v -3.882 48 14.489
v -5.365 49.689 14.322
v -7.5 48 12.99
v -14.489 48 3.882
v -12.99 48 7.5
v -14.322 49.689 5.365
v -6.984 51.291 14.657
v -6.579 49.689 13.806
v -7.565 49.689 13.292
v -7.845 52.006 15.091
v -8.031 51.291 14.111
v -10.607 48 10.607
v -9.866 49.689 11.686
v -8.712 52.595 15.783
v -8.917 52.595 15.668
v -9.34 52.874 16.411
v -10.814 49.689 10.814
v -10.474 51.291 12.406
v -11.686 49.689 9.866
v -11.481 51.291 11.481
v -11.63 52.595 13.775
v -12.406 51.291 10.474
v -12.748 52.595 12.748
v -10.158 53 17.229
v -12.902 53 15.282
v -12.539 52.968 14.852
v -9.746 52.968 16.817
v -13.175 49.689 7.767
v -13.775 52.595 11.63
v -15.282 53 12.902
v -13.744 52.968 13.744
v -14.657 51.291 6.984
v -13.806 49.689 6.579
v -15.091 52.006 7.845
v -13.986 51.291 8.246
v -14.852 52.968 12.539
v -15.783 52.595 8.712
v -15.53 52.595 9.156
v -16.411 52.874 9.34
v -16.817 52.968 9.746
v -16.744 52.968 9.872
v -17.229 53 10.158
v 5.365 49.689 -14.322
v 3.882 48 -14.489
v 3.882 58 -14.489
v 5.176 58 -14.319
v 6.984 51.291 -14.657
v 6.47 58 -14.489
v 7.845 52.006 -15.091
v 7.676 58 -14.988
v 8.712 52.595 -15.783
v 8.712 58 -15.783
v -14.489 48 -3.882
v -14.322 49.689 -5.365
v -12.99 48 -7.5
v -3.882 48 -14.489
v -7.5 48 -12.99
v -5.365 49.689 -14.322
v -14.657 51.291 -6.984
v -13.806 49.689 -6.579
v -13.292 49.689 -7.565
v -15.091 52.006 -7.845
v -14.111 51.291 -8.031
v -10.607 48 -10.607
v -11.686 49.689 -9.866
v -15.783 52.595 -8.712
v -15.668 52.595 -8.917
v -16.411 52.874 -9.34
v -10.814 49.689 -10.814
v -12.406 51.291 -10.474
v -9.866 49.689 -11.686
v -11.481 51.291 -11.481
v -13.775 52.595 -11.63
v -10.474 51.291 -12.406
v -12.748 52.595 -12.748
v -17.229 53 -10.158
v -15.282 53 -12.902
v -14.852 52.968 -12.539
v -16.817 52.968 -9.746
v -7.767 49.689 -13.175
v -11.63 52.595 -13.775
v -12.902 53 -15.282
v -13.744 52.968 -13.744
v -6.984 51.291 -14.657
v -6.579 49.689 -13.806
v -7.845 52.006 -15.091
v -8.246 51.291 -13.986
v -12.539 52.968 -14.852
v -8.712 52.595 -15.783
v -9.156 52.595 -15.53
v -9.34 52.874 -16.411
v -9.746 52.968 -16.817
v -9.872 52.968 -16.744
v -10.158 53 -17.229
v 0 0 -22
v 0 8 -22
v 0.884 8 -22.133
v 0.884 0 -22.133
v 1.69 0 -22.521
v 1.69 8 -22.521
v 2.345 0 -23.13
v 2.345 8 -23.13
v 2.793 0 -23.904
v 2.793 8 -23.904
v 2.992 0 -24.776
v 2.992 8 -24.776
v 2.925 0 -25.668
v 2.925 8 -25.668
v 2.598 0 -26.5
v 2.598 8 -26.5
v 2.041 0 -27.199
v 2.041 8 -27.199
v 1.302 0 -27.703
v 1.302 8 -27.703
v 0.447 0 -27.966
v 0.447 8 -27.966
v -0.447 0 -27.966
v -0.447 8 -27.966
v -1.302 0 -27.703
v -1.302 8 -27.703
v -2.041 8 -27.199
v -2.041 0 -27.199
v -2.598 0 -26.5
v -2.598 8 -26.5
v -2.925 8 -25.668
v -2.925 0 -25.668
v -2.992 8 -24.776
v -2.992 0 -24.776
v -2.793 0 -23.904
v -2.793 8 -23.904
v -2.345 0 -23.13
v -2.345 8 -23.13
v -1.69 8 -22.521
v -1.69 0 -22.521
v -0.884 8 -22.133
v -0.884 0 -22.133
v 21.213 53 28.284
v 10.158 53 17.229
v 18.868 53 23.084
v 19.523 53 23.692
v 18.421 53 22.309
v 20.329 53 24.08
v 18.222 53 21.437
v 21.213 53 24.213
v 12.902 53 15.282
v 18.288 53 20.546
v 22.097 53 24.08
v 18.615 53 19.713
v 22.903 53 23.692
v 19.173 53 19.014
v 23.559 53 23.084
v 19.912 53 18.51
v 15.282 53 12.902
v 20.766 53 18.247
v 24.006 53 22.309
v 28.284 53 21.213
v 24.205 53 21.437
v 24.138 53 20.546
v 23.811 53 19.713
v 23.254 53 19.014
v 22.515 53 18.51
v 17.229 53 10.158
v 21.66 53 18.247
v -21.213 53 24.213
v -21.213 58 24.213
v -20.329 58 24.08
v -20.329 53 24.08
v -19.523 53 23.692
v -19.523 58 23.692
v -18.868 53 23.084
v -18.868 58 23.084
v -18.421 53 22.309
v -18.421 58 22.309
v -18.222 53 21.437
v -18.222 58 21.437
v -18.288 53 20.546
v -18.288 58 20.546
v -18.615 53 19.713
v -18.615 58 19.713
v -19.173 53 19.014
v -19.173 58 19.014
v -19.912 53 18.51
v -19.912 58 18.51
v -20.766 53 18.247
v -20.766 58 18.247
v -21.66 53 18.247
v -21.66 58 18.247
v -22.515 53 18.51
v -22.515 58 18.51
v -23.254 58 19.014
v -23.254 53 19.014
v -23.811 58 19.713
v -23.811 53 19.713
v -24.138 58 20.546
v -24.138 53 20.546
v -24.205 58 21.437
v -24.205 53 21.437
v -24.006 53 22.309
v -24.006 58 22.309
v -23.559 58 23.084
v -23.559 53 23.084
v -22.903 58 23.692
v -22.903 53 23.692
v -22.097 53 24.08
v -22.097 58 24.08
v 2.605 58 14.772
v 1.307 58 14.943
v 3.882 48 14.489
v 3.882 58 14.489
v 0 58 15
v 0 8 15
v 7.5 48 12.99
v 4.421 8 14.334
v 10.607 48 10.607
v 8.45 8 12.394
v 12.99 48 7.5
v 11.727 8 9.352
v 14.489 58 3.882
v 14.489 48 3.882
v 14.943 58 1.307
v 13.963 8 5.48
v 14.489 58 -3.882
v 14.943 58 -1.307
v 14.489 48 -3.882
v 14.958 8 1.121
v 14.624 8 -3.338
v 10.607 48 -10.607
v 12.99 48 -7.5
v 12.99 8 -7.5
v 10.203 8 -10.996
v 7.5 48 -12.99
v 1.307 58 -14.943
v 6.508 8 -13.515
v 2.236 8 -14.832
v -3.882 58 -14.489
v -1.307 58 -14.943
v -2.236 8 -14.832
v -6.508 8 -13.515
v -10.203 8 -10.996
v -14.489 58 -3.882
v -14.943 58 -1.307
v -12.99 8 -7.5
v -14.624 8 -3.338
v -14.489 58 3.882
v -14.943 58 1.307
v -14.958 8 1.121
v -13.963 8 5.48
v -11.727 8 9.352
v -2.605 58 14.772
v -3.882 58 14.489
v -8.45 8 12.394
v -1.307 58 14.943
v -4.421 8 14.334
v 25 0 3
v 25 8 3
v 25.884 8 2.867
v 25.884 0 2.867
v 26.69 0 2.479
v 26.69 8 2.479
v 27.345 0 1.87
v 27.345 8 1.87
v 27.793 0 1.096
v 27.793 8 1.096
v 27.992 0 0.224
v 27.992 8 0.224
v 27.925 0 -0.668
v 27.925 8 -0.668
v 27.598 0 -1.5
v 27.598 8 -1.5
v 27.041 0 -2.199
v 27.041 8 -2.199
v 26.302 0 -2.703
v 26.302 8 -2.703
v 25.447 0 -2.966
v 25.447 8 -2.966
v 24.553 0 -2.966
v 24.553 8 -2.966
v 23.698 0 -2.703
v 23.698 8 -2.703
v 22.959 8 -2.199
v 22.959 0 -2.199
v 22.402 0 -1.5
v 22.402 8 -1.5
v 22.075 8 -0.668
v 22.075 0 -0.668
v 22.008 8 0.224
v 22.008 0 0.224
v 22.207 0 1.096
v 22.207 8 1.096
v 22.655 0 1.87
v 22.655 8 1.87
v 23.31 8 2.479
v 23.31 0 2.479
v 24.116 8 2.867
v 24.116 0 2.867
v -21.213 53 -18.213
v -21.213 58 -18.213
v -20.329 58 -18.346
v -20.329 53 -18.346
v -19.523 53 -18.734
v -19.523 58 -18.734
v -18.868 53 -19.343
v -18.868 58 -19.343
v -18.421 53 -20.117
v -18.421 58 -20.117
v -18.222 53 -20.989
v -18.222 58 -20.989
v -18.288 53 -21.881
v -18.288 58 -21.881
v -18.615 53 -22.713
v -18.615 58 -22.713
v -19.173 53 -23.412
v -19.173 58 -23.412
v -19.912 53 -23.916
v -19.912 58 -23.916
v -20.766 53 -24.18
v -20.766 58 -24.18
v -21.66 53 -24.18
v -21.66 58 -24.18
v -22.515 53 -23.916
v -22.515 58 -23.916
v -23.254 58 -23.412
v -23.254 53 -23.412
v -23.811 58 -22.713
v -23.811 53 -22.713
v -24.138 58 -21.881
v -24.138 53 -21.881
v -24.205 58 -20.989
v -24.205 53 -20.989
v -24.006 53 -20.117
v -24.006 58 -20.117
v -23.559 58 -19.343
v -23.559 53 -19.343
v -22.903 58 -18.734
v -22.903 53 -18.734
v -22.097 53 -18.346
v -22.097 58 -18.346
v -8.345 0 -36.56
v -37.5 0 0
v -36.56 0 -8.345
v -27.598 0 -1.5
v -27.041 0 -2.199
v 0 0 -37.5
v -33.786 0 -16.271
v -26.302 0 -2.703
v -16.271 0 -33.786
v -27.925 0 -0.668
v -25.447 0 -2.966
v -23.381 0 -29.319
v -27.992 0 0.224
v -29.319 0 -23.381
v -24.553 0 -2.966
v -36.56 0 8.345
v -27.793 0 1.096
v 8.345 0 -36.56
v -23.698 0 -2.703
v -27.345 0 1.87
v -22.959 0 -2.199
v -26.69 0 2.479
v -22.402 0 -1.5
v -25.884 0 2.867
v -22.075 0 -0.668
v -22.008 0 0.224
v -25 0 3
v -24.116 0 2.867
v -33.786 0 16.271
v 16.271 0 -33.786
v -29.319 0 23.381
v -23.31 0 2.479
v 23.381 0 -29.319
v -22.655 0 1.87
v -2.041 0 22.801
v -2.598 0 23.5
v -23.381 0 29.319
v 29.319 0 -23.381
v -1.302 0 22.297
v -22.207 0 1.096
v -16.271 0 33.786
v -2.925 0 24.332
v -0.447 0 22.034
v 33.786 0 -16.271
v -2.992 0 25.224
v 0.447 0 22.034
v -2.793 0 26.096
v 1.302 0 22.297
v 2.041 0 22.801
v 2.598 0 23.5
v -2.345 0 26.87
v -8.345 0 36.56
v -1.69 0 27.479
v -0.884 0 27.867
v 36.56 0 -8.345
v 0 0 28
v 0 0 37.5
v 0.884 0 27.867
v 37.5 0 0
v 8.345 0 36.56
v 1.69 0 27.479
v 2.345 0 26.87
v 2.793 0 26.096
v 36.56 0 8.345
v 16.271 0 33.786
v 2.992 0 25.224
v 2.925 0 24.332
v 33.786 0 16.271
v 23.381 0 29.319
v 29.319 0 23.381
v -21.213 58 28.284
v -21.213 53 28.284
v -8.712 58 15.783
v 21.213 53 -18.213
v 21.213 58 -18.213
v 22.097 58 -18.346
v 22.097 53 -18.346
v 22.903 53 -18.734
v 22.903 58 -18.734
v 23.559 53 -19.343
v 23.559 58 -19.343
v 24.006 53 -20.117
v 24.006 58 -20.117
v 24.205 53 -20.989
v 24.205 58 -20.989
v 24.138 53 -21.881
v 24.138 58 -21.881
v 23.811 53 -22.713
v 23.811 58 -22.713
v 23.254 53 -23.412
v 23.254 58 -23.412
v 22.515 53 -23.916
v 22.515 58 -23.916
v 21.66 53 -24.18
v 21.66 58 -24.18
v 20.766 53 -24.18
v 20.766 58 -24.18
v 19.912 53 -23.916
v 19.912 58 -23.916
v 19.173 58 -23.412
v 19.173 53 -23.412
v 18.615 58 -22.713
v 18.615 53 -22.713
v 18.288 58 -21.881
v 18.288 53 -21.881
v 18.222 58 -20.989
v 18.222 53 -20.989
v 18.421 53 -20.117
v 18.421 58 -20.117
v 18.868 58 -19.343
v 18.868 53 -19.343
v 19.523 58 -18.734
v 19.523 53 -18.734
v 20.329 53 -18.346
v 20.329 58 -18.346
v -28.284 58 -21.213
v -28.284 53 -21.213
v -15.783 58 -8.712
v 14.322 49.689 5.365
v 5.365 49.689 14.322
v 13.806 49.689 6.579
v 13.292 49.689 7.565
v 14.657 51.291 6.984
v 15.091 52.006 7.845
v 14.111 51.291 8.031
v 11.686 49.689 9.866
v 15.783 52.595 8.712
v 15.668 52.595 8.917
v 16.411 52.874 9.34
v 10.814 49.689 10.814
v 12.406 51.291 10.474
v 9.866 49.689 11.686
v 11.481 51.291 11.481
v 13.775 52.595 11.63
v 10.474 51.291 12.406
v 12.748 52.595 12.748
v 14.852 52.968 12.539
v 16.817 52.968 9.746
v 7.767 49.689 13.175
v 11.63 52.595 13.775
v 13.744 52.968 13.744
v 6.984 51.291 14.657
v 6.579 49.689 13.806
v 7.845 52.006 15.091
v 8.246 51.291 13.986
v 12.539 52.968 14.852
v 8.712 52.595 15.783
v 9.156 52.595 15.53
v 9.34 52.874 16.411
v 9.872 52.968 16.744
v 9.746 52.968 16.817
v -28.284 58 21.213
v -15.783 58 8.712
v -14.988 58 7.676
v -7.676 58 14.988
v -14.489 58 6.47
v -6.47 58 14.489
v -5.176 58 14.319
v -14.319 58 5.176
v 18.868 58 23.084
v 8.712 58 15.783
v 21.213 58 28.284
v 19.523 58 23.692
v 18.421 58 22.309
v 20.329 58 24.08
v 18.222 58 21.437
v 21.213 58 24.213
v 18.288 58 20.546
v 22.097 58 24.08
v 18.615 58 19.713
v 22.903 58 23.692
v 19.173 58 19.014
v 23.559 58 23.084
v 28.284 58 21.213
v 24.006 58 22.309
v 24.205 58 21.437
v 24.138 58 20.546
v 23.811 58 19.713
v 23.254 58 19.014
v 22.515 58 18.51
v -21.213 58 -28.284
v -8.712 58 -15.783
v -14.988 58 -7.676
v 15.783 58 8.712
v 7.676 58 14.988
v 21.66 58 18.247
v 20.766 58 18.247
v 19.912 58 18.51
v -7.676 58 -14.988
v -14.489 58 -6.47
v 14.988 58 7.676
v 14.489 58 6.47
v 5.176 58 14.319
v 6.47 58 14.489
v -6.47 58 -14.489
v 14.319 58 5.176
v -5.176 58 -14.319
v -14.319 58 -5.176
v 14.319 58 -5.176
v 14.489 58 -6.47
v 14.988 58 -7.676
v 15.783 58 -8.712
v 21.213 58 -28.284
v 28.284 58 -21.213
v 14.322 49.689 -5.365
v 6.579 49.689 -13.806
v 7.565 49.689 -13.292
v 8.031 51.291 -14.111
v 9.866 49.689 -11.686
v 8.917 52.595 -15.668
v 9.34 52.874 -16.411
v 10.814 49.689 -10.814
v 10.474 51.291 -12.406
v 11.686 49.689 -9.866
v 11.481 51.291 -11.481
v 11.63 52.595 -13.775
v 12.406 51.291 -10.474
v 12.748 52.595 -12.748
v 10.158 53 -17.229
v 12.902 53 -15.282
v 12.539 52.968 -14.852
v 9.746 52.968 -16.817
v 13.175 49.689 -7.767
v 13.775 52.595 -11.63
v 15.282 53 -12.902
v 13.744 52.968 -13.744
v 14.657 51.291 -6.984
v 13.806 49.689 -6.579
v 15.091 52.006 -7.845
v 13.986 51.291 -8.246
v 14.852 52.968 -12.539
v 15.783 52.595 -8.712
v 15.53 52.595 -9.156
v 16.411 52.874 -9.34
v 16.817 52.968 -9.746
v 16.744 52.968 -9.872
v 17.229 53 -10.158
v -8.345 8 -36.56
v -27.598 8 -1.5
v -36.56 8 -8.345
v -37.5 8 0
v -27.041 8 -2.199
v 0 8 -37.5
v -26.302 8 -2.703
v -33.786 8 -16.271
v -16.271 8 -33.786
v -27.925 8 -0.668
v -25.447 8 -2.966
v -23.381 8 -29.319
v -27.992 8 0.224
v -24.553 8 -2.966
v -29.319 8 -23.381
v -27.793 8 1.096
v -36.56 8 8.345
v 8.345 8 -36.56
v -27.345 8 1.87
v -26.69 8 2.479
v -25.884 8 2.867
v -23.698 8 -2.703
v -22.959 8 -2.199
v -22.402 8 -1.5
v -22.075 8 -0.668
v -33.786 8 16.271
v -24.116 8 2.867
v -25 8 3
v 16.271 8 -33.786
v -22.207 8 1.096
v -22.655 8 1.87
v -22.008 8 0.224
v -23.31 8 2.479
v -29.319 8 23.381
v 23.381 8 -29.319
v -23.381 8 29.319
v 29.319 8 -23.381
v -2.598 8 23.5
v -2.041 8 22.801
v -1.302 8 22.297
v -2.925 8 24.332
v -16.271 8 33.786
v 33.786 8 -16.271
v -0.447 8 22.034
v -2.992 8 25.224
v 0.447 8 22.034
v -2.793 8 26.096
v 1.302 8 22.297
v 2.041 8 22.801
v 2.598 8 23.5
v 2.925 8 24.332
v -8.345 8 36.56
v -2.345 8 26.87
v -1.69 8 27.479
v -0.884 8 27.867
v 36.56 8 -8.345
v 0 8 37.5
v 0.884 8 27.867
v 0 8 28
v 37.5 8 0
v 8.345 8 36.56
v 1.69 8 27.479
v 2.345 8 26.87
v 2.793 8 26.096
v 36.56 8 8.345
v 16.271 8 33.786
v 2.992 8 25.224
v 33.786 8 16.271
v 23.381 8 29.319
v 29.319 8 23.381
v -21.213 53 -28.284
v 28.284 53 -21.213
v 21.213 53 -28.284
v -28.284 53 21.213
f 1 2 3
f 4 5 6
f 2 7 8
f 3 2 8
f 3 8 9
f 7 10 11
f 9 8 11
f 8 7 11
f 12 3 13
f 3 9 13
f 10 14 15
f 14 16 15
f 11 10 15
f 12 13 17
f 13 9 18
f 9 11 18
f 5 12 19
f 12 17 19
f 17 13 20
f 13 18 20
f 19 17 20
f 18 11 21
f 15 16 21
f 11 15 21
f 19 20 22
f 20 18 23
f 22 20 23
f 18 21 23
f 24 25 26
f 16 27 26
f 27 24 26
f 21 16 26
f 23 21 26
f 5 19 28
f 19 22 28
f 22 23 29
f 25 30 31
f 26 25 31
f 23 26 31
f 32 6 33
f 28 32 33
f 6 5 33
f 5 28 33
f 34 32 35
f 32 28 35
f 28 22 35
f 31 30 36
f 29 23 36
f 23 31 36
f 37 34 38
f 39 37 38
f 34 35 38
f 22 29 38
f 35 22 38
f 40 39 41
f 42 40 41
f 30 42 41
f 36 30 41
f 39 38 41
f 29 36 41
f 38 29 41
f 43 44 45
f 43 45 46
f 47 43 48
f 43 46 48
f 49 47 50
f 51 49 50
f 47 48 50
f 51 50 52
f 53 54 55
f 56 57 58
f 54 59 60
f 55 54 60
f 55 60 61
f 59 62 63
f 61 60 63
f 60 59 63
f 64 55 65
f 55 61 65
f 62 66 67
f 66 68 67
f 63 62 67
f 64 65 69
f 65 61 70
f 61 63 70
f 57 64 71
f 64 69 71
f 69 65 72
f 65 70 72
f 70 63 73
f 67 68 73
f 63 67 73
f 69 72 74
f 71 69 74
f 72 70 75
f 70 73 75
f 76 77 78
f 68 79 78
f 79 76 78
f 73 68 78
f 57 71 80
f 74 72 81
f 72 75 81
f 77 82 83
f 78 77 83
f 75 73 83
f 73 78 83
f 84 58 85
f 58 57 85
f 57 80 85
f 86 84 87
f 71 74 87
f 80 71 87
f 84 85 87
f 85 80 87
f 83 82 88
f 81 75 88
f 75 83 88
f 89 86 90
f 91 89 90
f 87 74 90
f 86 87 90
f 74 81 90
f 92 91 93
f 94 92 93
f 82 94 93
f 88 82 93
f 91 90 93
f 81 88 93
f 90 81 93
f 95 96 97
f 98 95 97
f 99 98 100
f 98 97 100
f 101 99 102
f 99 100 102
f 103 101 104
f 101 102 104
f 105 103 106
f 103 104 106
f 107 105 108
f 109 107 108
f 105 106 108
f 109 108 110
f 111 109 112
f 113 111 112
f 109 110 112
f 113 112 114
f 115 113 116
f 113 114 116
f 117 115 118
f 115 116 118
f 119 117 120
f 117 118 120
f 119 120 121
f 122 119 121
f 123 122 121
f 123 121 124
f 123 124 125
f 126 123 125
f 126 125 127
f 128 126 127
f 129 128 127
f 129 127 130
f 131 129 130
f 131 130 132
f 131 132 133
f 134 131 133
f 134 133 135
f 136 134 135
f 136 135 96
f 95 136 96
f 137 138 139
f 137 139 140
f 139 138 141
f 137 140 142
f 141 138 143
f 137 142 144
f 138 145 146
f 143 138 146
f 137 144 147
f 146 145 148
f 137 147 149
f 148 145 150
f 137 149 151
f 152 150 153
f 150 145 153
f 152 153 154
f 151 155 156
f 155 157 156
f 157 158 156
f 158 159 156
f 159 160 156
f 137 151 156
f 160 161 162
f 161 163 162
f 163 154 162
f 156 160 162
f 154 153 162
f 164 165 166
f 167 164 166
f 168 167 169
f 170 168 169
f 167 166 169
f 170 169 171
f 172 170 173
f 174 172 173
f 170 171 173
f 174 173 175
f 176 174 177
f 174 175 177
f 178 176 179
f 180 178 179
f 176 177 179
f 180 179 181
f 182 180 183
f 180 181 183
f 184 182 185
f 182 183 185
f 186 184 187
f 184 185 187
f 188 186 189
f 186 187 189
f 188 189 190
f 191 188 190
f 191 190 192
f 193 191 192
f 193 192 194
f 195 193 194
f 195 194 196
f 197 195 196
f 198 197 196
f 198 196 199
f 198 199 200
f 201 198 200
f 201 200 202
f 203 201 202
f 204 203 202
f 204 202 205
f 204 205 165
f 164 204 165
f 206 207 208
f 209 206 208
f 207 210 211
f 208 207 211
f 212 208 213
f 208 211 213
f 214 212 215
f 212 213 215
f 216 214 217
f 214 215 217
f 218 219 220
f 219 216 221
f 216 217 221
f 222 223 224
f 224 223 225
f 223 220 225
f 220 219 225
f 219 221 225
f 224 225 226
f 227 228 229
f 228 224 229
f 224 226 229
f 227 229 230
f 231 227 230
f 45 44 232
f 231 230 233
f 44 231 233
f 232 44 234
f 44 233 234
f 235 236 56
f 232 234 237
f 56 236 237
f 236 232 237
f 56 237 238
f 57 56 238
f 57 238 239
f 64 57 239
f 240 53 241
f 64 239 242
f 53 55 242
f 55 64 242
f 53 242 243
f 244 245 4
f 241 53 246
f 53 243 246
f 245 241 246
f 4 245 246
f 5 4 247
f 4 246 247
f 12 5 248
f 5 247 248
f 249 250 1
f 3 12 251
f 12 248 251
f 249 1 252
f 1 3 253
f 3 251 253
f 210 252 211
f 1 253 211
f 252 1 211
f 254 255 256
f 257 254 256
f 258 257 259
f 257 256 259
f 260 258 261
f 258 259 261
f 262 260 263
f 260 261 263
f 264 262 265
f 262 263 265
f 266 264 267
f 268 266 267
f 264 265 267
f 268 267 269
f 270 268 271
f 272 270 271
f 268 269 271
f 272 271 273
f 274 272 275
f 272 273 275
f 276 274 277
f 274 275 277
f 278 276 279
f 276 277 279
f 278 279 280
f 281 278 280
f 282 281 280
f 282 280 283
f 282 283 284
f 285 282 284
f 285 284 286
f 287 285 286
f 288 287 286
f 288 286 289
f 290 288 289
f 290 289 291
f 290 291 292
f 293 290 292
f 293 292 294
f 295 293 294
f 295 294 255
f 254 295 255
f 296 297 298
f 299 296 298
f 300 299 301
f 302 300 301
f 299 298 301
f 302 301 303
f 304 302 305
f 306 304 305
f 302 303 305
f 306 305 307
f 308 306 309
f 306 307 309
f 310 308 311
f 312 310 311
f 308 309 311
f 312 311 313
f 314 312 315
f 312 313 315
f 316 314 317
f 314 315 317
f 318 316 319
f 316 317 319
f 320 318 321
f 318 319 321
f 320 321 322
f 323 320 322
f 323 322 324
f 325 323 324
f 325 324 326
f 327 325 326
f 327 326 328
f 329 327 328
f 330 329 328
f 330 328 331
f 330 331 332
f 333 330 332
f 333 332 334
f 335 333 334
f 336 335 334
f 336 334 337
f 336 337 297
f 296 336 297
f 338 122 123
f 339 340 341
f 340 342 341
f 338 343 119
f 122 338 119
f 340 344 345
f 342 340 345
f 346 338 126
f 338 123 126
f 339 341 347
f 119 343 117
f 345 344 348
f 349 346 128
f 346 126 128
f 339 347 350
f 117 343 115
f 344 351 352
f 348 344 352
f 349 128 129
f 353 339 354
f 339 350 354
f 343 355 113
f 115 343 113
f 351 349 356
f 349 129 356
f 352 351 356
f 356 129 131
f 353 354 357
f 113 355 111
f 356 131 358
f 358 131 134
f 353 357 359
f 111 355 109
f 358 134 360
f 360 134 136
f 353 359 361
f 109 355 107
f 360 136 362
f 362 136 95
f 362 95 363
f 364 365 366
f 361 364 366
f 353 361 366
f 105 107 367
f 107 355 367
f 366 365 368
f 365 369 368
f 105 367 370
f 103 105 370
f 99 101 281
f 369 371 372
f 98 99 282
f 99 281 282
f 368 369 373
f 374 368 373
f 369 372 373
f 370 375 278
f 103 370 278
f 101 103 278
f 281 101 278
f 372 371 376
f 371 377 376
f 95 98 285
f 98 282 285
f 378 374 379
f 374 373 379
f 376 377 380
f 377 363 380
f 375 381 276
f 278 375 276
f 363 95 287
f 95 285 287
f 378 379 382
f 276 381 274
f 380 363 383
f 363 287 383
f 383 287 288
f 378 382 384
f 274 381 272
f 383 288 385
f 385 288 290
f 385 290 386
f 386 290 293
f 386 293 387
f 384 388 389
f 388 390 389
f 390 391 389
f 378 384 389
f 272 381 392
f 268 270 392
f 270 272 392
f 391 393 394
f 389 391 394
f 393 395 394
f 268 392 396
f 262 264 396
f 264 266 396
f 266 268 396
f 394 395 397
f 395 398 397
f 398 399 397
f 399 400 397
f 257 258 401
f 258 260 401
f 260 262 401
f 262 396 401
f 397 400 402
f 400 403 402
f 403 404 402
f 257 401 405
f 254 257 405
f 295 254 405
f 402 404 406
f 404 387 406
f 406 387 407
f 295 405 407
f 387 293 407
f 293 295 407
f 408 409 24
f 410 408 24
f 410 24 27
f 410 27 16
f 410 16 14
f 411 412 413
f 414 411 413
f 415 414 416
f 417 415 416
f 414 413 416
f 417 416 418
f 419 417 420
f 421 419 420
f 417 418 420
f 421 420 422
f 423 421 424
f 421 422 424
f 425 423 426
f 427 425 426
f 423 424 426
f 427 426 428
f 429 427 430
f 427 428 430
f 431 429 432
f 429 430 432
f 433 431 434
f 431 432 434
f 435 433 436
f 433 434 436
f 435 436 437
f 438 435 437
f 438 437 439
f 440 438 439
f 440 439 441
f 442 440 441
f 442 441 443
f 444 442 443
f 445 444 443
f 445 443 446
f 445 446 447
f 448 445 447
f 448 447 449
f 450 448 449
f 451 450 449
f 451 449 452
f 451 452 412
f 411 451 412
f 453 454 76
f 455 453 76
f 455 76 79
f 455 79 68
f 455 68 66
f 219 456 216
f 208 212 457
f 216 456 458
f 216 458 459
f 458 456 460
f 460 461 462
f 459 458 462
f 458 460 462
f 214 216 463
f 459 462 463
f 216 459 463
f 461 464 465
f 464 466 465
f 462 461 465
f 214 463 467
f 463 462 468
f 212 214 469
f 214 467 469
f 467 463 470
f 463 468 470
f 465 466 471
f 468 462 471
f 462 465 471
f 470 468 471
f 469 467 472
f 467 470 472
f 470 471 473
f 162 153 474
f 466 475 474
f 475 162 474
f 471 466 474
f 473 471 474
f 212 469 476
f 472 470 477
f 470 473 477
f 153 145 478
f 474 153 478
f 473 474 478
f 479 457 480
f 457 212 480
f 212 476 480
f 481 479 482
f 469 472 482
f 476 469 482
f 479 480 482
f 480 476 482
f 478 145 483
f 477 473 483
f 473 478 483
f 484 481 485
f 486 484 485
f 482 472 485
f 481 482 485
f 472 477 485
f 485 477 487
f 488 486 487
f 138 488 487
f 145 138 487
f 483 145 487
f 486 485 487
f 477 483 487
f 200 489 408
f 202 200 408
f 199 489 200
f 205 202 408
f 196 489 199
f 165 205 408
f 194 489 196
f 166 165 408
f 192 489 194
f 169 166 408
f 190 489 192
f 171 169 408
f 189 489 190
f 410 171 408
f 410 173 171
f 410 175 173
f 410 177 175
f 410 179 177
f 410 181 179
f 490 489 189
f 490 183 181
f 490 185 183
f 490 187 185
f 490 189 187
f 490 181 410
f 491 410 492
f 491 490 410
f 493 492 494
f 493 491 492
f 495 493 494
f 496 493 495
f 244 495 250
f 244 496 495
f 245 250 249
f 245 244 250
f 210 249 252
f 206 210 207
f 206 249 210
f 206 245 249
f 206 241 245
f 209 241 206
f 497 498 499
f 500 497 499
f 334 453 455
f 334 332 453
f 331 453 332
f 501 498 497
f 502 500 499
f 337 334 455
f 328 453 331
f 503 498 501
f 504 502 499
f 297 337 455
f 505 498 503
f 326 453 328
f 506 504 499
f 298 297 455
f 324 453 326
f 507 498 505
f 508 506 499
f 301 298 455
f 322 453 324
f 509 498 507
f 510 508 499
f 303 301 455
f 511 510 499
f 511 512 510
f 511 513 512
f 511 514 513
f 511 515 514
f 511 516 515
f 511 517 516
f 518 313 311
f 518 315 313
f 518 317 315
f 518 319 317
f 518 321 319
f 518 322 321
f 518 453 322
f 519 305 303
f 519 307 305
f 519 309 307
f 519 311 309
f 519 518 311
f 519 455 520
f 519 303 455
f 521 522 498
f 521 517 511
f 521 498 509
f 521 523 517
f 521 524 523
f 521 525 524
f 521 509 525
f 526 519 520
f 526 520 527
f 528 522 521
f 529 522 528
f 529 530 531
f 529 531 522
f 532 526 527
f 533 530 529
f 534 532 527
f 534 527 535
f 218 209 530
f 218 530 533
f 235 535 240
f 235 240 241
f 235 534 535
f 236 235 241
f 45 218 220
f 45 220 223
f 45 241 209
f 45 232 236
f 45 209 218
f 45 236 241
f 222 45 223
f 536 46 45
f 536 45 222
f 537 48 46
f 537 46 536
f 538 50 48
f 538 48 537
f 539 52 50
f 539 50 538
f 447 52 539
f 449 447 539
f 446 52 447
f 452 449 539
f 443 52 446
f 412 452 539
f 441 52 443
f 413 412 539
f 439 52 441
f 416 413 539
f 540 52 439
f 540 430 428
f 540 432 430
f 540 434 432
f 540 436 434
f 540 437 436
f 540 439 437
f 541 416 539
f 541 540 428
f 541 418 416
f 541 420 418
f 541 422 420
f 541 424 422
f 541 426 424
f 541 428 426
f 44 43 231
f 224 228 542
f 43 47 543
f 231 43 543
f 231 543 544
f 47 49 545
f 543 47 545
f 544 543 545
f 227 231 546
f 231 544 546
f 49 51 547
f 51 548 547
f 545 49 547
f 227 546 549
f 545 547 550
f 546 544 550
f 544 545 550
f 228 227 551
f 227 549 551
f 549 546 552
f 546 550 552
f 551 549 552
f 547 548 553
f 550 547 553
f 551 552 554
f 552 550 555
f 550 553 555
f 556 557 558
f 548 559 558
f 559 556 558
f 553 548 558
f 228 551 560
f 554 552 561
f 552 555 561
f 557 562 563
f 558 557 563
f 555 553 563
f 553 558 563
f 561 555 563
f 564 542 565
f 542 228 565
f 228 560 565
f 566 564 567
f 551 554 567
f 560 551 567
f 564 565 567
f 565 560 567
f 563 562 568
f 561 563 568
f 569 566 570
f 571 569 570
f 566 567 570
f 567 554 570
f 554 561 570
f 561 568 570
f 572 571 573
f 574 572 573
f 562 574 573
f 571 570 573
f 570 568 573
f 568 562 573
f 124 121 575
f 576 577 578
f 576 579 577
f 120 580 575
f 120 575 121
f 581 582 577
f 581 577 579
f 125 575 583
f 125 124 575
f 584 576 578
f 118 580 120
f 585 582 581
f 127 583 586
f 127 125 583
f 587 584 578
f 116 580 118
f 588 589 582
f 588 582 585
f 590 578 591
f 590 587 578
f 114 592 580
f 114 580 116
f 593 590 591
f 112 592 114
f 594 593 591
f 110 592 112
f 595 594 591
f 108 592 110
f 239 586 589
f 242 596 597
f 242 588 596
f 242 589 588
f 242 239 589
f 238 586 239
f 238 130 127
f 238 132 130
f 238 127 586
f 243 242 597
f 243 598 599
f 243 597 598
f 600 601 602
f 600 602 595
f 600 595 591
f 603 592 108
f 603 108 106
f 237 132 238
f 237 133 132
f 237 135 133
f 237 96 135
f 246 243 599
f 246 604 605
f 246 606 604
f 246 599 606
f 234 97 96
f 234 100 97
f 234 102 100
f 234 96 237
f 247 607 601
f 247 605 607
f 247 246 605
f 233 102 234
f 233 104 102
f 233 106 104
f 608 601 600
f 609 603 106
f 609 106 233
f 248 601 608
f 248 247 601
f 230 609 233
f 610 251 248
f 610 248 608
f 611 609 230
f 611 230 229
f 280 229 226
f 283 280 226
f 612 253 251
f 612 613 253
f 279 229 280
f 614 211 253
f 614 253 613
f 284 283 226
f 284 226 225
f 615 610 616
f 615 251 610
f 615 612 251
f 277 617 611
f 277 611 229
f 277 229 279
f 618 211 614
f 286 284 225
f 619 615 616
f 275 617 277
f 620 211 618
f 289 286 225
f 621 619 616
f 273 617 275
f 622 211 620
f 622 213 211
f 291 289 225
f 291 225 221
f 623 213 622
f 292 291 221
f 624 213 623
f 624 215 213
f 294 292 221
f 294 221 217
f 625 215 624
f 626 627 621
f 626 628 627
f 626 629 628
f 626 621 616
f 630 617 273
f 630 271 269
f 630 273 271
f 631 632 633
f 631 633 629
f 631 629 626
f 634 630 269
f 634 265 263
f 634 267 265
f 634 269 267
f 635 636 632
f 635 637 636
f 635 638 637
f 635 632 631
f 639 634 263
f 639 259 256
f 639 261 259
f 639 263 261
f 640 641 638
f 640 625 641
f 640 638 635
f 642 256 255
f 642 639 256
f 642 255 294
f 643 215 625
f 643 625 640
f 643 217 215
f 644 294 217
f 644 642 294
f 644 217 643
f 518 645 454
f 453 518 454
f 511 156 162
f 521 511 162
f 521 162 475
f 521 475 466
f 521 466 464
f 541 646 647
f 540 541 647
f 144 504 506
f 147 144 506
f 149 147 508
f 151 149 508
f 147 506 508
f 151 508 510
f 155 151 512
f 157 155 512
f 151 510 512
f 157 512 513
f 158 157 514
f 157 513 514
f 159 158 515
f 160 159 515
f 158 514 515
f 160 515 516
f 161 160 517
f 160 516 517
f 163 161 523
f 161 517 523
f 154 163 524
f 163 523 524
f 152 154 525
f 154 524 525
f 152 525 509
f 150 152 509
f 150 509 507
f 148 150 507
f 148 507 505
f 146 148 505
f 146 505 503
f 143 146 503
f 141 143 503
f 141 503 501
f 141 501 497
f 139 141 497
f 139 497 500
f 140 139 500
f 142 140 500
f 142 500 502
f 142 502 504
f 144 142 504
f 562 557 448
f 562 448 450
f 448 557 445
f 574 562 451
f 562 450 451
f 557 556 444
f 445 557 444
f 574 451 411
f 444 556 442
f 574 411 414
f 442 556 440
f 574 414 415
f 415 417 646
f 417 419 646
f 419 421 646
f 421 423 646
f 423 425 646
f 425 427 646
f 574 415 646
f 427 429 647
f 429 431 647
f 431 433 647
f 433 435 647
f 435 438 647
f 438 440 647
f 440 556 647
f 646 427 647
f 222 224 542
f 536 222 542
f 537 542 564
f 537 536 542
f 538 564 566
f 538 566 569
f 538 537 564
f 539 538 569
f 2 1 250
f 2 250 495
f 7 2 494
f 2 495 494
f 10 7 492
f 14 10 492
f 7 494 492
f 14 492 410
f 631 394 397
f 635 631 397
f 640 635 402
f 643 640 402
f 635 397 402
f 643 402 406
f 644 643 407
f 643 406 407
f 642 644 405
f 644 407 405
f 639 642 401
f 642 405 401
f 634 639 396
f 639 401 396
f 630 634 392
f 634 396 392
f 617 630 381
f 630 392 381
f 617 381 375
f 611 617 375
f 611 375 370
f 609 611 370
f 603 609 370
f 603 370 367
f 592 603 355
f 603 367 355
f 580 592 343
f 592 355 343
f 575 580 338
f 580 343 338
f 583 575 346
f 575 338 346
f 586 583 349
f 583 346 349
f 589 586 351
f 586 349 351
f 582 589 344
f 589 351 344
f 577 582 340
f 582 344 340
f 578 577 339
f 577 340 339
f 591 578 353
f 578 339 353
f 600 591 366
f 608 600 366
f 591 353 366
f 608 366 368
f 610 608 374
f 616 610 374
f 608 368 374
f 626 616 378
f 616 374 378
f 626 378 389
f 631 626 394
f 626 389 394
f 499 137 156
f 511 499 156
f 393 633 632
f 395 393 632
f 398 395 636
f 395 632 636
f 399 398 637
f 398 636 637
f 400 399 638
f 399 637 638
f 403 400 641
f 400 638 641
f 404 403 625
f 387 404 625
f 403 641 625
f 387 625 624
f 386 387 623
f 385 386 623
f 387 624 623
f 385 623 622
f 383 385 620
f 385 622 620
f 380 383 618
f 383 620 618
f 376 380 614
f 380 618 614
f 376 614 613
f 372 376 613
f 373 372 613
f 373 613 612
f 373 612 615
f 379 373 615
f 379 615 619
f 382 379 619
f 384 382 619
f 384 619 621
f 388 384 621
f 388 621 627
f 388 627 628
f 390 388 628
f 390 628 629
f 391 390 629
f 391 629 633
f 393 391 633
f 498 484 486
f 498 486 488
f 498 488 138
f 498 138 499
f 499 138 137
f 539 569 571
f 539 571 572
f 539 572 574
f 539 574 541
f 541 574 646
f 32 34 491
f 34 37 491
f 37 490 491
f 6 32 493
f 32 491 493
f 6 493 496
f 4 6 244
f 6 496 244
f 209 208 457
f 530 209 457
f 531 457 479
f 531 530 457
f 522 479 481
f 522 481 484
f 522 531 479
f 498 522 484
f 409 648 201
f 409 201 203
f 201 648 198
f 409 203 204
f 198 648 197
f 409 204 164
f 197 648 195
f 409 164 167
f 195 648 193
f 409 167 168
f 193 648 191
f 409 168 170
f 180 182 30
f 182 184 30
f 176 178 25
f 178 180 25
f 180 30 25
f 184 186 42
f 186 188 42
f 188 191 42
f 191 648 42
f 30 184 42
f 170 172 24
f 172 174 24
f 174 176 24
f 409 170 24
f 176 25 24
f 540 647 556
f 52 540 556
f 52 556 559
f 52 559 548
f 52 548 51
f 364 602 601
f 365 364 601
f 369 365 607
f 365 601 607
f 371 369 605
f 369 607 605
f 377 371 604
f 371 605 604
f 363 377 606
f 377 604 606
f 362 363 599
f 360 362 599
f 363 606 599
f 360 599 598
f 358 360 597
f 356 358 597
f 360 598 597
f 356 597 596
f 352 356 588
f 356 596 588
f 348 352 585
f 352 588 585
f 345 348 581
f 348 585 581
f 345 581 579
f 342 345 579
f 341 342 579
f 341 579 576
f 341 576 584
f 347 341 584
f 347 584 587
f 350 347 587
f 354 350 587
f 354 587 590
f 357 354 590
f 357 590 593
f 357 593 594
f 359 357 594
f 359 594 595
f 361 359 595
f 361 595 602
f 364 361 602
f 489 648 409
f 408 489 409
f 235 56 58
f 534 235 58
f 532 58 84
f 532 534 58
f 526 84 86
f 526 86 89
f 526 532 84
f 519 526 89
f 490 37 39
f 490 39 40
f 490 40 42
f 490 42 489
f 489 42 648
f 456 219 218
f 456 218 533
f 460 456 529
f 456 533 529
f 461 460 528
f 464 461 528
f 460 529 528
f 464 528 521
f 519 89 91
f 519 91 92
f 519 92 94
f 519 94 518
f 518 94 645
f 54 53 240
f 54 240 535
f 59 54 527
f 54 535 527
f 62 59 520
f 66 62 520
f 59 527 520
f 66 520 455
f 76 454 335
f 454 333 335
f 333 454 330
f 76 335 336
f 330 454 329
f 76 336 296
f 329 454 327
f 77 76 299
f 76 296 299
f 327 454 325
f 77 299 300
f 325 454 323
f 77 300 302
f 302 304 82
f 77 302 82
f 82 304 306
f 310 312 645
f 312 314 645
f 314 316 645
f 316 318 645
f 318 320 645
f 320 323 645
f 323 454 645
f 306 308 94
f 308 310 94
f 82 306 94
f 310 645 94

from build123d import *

# Parameters (mm, degrees)
SKETCH1_R           = 37.5
BOSS_EXTRUDE1_DEPTH = 8
SKETCH2_R           = 3
CUT_EXTRUDE1_DEPTH  = 54.633012222
SKETCH3_R           = 15
BOSS_EXTRUDE2_DEPTH = 50
BOSS_EXTRUDE4_START = -5
BOSS_EXTRUDE4_DEPTH = 5
CUT_EXTRUDE2_REACH  = 80.591
SKETCH5_R           = 3
FILLET1_R           = 5


with BuildPart() as part:
    # Sketch1 → Boss-Extrude1 (new body)
    with BuildSketch(Plane(origin=(0, 0, 0), x_dir=(1, 0, 0), z_dir=(0, 1, 0))):
        with Locations(Location((0, 0, 0), (0, 0, 270))):
            Circle(SKETCH1_R)
    extrude(amount=BOSS_EXTRUDE1_DEPTH)

    # Sketch2 → Cut-Extrude1 (cut, through all)
    with BuildSketch(Plane(origin=(0, 8, 0), x_dir=(1, 0, 0), z_dir=(0, 1, 0))):
        with Locations(Location((25, 0, 0), (0, 0, 270))):
            Circle(SKETCH2_R)
        with Locations(Location((0, 25, 0), (0, 0, 270))):
            Circle(SKETCH2_R)
        with Locations(Location((-25, 0, 0), (0, 0, 270))):
            Circle(SKETCH2_R)
        with Locations(Location((0, -25, 0), (0, 0, 270))):
            Circle(SKETCH2_R)
    extrude(amount=-CUT_EXTRUDE1_DEPTH, mode=Mode.SUBTRACT)

    # Sketch3 → Boss-Extrude2 (add)
    with BuildSketch(Plane(origin=(0, 8, 0), x_dir=(1, 0, 0), z_dir=(0, 1, 0))):
        with Locations(Location((0, 0, 0), (0, 0, 270))):
            Circle(SKETCH3_R)
    extrude(amount=BOSS_EXTRUDE2_DEPTH)

    # Sketch7 → Boss-Extrude4 (add)
    with BuildSketch(Plane(origin=(0, 58, 0), x_dir=(1, 0, 0), z_dir=(0, 1, 0)).offset(BOSS_EXTRUDE4_START)):
        with BuildLine():
            ThreePointArc((-6.464466094, -13.535533906), (-10.606601718, -10.606601718), (-13.535533906, -6.464466094))
            Line((-13.535533906, -6.464466094), (-28.284271247, -21.213203436))
            Line((-28.284271247, -21.213203436), (-21.213203436, -28.284271247))
            Line((-21.213203436, -28.284271247), (-6.464466094, -13.535533906))
        make_face()
        with BuildLine():
            Line((0, -7.071067812), (-7.071067812, 0))
            Line((-7.071067812, 0), (-13.535533906, -6.464466094))
            ThreePointArc((-13.535533906, -6.464466094), (-10.606601718, -10.606601718), (-6.464466094, -13.535533906))
            Line((-6.464466094, -13.535533906), (0, -7.071067812))
        make_face()
        with BuildLine():
            ThreePointArc((13.535533906, -6.464466094), (10.606601718, -10.606601718), (6.464466094, -13.535533906))
            Line((6.464466094, -13.535533906), (21.213203436, -28.284271247))
            Line((21.213203436, -28.284271247), (28.284271247, -21.213203436))
            Line((28.284271247, -21.213203436), (13.535533906, -6.464466094))
        make_face()
        Polygon((0, 7.071067812), (-7.071067812, 0), (0, -7.071067812), (7.071067812, 0), align=None)
        with BuildLine():
            Line((7.071067812, 0), (0, -7.071067812))
            Line((0, -7.071067812), (6.464466094, -13.535533906))
            ThreePointArc((6.464466094, -13.535533906), (10.606601718, -10.606601718), (13.535533906, -6.464466094))
            Line((13.535533906, -6.464466094), (7.071067812, 0))
        make_face()
        with BuildLine():
            Line((21.213203436, 28.284271247), (6.464466094, 13.535533906))
            ThreePointArc((6.464466094, 13.535533906), (10.606601718, 10.606601718), (13.535533906, 6.464466094))
            Line((13.535533906, 6.464466094), (28.284271247, 21.213203436))
            Line((28.284271247, 21.213203436), (21.213203436, 28.284271247))
        make_face()
        with BuildLine():
            Line((6.464466094, 13.535533906), (0, 7.071067812))
            Line((0, 7.071067812), (7.071067812, 0))
            Line((7.071067812, 0), (13.535533906, 6.464466094))
            ThreePointArc((13.535533906, 6.464466094), (10.606601718, 10.606601718), (6.464466094, 13.535533906))
        make_face()
        with BuildLine():
            Line((-21.213203436, 28.284271247), (-28.284271247, 21.213203436))
            Line((-28.284271247, 21.213203436), (-13.535533906, 6.464466094))
            ThreePointArc((-13.535533906, 6.464466094), (-10.606601718, 10.606601718), (-6.464466094, 13.535533906))
            Line((-6.464466094, 13.535533906), (-21.213203436, 28.284271247))
        make_face()
        with BuildLine():
            ThreePointArc((-6.464466094, 13.535533906), (-10.606601718, 10.606601718), (-13.535533906, 6.464466094))
            Line((-13.535533906, 6.464466094), (-7.071067812, 0))
            Line((-7.071067812, 0), (0, 7.071067812))
            Line((0, 7.071067812), (-6.464466094, 13.535533906))
        make_face()
    extrude(amount=BOSS_EXTRUDE4_DEPTH)

    # Sketch5 → Cut-Extrude2 (cut, up to next)
    with BuildSketch(Plane(origin=(0, 58, 0), x_dir=(1, 0, 0), z_dir=(0, 1, 0)), mode=Mode.PRIVATE) as cut_extrude2_sk1:
        with Locations(Location((21.213203436, -21.213203436, 0), (0, 0, 270))):
            Circle(SKETCH5_R)
    cut_extrude2_tool1 = extrude(cut_extrude2_sk1.sketch, amount=-CUT_EXTRUDE2_REACH, mode=Mode.PRIVATE) & part.part
    # Sketch5 → Cut-Extrude2 (cut, up to next)
    with BuildSketch(Plane(origin=(0, 58, 0), x_dir=(1, 0, 0), z_dir=(0, 1, 0)), mode=Mode.PRIVATE) as cut_extrude2_sk2:
        with Locations(Location((-21.213203436, 21.213203436, 0), (0, 0, 270))):
            Circle(SKETCH5_R)
    cut_extrude2_tool2 = extrude(cut_extrude2_sk2.sketch, amount=-CUT_EXTRUDE2_REACH, mode=Mode.PRIVATE) & part.part
    # Sketch5 → Cut-Extrude2 (cut, up to next)
    with BuildSketch(Plane(origin=(0, 58, 0), x_dir=(1, 0, 0), z_dir=(0, 1, 0)), mode=Mode.PRIVATE) as cut_extrude2_sk3:
        with Locations(Location((-21.213203436, -21.213203436, 0), (0, 0, 270))):
            Circle(SKETCH5_R)
    cut_extrude2_tool3 = extrude(cut_extrude2_sk3.sketch, amount=-CUT_EXTRUDE2_REACH, mode=Mode.PRIVATE) & part.part
    # Sketch5 → Cut-Extrude2 (cut, up to next)
    with BuildSketch(Plane(origin=(0, 58, 0), x_dir=(1, 0, 0), z_dir=(0, 1, 0)), mode=Mode.PRIVATE) as cut_extrude2_sk4:
        with Locations(Location((21.213203436, 21.213203436, 0), (0, 0, 270))):
            Circle(SKETCH5_R)
    cut_extrude2_tool4 = extrude(cut_extrude2_sk4.sketch, amount=-CUT_EXTRUDE2_REACH, mode=Mode.PRIVATE) & part.part
    add(cut_extrude2_tool1.solids().sort_by_distance((21.213203, 58, 21.213203))[0], mode=Mode.SUBTRACT)
    add(cut_extrude2_tool2.solids().sort_by_distance((-21.213203, 58, -21.213203))[0], mode=Mode.SUBTRACT)
    add(cut_extrude2_tool3.solids().sort_by_distance((-21.213203, 58, 21.213203))[0], mode=Mode.SUBTRACT)
    add(cut_extrude2_tool4.solids().sort_by_distance((21.213203, 58, -21.213203))[0], mode=Mode.SUBTRACT)

    # Fillet1
    fillet1_edges = [part.edges().sort_by_distance(p)[0] for p in [
        (-10.606601718, 53, 10.606601718),
        (-10.606601718, 53, -10.606601718),
        (10.606601718, 53, -10.606601718),
        (10.606601718, 53, 10.606601718),
        (13.535533906, 55.5, 6.464466094),
        (-13.535533906, 55.5, 6.464466094),
        (-6.464466094, 55.5, -13.535533906),
        (6.464466094, 55.5, -13.535533906),
        (6.464466094, 55.5, 13.535533906),
        (-6.464466094, 55.5, 13.535533906),
        (-13.535533906, 55.5, -6.464466094),
        (13.535533906, 55.5, -6.464466094),
    ]]
    fillet(fillet1_edges, radius=FILLET1_R)


solid = part.part
